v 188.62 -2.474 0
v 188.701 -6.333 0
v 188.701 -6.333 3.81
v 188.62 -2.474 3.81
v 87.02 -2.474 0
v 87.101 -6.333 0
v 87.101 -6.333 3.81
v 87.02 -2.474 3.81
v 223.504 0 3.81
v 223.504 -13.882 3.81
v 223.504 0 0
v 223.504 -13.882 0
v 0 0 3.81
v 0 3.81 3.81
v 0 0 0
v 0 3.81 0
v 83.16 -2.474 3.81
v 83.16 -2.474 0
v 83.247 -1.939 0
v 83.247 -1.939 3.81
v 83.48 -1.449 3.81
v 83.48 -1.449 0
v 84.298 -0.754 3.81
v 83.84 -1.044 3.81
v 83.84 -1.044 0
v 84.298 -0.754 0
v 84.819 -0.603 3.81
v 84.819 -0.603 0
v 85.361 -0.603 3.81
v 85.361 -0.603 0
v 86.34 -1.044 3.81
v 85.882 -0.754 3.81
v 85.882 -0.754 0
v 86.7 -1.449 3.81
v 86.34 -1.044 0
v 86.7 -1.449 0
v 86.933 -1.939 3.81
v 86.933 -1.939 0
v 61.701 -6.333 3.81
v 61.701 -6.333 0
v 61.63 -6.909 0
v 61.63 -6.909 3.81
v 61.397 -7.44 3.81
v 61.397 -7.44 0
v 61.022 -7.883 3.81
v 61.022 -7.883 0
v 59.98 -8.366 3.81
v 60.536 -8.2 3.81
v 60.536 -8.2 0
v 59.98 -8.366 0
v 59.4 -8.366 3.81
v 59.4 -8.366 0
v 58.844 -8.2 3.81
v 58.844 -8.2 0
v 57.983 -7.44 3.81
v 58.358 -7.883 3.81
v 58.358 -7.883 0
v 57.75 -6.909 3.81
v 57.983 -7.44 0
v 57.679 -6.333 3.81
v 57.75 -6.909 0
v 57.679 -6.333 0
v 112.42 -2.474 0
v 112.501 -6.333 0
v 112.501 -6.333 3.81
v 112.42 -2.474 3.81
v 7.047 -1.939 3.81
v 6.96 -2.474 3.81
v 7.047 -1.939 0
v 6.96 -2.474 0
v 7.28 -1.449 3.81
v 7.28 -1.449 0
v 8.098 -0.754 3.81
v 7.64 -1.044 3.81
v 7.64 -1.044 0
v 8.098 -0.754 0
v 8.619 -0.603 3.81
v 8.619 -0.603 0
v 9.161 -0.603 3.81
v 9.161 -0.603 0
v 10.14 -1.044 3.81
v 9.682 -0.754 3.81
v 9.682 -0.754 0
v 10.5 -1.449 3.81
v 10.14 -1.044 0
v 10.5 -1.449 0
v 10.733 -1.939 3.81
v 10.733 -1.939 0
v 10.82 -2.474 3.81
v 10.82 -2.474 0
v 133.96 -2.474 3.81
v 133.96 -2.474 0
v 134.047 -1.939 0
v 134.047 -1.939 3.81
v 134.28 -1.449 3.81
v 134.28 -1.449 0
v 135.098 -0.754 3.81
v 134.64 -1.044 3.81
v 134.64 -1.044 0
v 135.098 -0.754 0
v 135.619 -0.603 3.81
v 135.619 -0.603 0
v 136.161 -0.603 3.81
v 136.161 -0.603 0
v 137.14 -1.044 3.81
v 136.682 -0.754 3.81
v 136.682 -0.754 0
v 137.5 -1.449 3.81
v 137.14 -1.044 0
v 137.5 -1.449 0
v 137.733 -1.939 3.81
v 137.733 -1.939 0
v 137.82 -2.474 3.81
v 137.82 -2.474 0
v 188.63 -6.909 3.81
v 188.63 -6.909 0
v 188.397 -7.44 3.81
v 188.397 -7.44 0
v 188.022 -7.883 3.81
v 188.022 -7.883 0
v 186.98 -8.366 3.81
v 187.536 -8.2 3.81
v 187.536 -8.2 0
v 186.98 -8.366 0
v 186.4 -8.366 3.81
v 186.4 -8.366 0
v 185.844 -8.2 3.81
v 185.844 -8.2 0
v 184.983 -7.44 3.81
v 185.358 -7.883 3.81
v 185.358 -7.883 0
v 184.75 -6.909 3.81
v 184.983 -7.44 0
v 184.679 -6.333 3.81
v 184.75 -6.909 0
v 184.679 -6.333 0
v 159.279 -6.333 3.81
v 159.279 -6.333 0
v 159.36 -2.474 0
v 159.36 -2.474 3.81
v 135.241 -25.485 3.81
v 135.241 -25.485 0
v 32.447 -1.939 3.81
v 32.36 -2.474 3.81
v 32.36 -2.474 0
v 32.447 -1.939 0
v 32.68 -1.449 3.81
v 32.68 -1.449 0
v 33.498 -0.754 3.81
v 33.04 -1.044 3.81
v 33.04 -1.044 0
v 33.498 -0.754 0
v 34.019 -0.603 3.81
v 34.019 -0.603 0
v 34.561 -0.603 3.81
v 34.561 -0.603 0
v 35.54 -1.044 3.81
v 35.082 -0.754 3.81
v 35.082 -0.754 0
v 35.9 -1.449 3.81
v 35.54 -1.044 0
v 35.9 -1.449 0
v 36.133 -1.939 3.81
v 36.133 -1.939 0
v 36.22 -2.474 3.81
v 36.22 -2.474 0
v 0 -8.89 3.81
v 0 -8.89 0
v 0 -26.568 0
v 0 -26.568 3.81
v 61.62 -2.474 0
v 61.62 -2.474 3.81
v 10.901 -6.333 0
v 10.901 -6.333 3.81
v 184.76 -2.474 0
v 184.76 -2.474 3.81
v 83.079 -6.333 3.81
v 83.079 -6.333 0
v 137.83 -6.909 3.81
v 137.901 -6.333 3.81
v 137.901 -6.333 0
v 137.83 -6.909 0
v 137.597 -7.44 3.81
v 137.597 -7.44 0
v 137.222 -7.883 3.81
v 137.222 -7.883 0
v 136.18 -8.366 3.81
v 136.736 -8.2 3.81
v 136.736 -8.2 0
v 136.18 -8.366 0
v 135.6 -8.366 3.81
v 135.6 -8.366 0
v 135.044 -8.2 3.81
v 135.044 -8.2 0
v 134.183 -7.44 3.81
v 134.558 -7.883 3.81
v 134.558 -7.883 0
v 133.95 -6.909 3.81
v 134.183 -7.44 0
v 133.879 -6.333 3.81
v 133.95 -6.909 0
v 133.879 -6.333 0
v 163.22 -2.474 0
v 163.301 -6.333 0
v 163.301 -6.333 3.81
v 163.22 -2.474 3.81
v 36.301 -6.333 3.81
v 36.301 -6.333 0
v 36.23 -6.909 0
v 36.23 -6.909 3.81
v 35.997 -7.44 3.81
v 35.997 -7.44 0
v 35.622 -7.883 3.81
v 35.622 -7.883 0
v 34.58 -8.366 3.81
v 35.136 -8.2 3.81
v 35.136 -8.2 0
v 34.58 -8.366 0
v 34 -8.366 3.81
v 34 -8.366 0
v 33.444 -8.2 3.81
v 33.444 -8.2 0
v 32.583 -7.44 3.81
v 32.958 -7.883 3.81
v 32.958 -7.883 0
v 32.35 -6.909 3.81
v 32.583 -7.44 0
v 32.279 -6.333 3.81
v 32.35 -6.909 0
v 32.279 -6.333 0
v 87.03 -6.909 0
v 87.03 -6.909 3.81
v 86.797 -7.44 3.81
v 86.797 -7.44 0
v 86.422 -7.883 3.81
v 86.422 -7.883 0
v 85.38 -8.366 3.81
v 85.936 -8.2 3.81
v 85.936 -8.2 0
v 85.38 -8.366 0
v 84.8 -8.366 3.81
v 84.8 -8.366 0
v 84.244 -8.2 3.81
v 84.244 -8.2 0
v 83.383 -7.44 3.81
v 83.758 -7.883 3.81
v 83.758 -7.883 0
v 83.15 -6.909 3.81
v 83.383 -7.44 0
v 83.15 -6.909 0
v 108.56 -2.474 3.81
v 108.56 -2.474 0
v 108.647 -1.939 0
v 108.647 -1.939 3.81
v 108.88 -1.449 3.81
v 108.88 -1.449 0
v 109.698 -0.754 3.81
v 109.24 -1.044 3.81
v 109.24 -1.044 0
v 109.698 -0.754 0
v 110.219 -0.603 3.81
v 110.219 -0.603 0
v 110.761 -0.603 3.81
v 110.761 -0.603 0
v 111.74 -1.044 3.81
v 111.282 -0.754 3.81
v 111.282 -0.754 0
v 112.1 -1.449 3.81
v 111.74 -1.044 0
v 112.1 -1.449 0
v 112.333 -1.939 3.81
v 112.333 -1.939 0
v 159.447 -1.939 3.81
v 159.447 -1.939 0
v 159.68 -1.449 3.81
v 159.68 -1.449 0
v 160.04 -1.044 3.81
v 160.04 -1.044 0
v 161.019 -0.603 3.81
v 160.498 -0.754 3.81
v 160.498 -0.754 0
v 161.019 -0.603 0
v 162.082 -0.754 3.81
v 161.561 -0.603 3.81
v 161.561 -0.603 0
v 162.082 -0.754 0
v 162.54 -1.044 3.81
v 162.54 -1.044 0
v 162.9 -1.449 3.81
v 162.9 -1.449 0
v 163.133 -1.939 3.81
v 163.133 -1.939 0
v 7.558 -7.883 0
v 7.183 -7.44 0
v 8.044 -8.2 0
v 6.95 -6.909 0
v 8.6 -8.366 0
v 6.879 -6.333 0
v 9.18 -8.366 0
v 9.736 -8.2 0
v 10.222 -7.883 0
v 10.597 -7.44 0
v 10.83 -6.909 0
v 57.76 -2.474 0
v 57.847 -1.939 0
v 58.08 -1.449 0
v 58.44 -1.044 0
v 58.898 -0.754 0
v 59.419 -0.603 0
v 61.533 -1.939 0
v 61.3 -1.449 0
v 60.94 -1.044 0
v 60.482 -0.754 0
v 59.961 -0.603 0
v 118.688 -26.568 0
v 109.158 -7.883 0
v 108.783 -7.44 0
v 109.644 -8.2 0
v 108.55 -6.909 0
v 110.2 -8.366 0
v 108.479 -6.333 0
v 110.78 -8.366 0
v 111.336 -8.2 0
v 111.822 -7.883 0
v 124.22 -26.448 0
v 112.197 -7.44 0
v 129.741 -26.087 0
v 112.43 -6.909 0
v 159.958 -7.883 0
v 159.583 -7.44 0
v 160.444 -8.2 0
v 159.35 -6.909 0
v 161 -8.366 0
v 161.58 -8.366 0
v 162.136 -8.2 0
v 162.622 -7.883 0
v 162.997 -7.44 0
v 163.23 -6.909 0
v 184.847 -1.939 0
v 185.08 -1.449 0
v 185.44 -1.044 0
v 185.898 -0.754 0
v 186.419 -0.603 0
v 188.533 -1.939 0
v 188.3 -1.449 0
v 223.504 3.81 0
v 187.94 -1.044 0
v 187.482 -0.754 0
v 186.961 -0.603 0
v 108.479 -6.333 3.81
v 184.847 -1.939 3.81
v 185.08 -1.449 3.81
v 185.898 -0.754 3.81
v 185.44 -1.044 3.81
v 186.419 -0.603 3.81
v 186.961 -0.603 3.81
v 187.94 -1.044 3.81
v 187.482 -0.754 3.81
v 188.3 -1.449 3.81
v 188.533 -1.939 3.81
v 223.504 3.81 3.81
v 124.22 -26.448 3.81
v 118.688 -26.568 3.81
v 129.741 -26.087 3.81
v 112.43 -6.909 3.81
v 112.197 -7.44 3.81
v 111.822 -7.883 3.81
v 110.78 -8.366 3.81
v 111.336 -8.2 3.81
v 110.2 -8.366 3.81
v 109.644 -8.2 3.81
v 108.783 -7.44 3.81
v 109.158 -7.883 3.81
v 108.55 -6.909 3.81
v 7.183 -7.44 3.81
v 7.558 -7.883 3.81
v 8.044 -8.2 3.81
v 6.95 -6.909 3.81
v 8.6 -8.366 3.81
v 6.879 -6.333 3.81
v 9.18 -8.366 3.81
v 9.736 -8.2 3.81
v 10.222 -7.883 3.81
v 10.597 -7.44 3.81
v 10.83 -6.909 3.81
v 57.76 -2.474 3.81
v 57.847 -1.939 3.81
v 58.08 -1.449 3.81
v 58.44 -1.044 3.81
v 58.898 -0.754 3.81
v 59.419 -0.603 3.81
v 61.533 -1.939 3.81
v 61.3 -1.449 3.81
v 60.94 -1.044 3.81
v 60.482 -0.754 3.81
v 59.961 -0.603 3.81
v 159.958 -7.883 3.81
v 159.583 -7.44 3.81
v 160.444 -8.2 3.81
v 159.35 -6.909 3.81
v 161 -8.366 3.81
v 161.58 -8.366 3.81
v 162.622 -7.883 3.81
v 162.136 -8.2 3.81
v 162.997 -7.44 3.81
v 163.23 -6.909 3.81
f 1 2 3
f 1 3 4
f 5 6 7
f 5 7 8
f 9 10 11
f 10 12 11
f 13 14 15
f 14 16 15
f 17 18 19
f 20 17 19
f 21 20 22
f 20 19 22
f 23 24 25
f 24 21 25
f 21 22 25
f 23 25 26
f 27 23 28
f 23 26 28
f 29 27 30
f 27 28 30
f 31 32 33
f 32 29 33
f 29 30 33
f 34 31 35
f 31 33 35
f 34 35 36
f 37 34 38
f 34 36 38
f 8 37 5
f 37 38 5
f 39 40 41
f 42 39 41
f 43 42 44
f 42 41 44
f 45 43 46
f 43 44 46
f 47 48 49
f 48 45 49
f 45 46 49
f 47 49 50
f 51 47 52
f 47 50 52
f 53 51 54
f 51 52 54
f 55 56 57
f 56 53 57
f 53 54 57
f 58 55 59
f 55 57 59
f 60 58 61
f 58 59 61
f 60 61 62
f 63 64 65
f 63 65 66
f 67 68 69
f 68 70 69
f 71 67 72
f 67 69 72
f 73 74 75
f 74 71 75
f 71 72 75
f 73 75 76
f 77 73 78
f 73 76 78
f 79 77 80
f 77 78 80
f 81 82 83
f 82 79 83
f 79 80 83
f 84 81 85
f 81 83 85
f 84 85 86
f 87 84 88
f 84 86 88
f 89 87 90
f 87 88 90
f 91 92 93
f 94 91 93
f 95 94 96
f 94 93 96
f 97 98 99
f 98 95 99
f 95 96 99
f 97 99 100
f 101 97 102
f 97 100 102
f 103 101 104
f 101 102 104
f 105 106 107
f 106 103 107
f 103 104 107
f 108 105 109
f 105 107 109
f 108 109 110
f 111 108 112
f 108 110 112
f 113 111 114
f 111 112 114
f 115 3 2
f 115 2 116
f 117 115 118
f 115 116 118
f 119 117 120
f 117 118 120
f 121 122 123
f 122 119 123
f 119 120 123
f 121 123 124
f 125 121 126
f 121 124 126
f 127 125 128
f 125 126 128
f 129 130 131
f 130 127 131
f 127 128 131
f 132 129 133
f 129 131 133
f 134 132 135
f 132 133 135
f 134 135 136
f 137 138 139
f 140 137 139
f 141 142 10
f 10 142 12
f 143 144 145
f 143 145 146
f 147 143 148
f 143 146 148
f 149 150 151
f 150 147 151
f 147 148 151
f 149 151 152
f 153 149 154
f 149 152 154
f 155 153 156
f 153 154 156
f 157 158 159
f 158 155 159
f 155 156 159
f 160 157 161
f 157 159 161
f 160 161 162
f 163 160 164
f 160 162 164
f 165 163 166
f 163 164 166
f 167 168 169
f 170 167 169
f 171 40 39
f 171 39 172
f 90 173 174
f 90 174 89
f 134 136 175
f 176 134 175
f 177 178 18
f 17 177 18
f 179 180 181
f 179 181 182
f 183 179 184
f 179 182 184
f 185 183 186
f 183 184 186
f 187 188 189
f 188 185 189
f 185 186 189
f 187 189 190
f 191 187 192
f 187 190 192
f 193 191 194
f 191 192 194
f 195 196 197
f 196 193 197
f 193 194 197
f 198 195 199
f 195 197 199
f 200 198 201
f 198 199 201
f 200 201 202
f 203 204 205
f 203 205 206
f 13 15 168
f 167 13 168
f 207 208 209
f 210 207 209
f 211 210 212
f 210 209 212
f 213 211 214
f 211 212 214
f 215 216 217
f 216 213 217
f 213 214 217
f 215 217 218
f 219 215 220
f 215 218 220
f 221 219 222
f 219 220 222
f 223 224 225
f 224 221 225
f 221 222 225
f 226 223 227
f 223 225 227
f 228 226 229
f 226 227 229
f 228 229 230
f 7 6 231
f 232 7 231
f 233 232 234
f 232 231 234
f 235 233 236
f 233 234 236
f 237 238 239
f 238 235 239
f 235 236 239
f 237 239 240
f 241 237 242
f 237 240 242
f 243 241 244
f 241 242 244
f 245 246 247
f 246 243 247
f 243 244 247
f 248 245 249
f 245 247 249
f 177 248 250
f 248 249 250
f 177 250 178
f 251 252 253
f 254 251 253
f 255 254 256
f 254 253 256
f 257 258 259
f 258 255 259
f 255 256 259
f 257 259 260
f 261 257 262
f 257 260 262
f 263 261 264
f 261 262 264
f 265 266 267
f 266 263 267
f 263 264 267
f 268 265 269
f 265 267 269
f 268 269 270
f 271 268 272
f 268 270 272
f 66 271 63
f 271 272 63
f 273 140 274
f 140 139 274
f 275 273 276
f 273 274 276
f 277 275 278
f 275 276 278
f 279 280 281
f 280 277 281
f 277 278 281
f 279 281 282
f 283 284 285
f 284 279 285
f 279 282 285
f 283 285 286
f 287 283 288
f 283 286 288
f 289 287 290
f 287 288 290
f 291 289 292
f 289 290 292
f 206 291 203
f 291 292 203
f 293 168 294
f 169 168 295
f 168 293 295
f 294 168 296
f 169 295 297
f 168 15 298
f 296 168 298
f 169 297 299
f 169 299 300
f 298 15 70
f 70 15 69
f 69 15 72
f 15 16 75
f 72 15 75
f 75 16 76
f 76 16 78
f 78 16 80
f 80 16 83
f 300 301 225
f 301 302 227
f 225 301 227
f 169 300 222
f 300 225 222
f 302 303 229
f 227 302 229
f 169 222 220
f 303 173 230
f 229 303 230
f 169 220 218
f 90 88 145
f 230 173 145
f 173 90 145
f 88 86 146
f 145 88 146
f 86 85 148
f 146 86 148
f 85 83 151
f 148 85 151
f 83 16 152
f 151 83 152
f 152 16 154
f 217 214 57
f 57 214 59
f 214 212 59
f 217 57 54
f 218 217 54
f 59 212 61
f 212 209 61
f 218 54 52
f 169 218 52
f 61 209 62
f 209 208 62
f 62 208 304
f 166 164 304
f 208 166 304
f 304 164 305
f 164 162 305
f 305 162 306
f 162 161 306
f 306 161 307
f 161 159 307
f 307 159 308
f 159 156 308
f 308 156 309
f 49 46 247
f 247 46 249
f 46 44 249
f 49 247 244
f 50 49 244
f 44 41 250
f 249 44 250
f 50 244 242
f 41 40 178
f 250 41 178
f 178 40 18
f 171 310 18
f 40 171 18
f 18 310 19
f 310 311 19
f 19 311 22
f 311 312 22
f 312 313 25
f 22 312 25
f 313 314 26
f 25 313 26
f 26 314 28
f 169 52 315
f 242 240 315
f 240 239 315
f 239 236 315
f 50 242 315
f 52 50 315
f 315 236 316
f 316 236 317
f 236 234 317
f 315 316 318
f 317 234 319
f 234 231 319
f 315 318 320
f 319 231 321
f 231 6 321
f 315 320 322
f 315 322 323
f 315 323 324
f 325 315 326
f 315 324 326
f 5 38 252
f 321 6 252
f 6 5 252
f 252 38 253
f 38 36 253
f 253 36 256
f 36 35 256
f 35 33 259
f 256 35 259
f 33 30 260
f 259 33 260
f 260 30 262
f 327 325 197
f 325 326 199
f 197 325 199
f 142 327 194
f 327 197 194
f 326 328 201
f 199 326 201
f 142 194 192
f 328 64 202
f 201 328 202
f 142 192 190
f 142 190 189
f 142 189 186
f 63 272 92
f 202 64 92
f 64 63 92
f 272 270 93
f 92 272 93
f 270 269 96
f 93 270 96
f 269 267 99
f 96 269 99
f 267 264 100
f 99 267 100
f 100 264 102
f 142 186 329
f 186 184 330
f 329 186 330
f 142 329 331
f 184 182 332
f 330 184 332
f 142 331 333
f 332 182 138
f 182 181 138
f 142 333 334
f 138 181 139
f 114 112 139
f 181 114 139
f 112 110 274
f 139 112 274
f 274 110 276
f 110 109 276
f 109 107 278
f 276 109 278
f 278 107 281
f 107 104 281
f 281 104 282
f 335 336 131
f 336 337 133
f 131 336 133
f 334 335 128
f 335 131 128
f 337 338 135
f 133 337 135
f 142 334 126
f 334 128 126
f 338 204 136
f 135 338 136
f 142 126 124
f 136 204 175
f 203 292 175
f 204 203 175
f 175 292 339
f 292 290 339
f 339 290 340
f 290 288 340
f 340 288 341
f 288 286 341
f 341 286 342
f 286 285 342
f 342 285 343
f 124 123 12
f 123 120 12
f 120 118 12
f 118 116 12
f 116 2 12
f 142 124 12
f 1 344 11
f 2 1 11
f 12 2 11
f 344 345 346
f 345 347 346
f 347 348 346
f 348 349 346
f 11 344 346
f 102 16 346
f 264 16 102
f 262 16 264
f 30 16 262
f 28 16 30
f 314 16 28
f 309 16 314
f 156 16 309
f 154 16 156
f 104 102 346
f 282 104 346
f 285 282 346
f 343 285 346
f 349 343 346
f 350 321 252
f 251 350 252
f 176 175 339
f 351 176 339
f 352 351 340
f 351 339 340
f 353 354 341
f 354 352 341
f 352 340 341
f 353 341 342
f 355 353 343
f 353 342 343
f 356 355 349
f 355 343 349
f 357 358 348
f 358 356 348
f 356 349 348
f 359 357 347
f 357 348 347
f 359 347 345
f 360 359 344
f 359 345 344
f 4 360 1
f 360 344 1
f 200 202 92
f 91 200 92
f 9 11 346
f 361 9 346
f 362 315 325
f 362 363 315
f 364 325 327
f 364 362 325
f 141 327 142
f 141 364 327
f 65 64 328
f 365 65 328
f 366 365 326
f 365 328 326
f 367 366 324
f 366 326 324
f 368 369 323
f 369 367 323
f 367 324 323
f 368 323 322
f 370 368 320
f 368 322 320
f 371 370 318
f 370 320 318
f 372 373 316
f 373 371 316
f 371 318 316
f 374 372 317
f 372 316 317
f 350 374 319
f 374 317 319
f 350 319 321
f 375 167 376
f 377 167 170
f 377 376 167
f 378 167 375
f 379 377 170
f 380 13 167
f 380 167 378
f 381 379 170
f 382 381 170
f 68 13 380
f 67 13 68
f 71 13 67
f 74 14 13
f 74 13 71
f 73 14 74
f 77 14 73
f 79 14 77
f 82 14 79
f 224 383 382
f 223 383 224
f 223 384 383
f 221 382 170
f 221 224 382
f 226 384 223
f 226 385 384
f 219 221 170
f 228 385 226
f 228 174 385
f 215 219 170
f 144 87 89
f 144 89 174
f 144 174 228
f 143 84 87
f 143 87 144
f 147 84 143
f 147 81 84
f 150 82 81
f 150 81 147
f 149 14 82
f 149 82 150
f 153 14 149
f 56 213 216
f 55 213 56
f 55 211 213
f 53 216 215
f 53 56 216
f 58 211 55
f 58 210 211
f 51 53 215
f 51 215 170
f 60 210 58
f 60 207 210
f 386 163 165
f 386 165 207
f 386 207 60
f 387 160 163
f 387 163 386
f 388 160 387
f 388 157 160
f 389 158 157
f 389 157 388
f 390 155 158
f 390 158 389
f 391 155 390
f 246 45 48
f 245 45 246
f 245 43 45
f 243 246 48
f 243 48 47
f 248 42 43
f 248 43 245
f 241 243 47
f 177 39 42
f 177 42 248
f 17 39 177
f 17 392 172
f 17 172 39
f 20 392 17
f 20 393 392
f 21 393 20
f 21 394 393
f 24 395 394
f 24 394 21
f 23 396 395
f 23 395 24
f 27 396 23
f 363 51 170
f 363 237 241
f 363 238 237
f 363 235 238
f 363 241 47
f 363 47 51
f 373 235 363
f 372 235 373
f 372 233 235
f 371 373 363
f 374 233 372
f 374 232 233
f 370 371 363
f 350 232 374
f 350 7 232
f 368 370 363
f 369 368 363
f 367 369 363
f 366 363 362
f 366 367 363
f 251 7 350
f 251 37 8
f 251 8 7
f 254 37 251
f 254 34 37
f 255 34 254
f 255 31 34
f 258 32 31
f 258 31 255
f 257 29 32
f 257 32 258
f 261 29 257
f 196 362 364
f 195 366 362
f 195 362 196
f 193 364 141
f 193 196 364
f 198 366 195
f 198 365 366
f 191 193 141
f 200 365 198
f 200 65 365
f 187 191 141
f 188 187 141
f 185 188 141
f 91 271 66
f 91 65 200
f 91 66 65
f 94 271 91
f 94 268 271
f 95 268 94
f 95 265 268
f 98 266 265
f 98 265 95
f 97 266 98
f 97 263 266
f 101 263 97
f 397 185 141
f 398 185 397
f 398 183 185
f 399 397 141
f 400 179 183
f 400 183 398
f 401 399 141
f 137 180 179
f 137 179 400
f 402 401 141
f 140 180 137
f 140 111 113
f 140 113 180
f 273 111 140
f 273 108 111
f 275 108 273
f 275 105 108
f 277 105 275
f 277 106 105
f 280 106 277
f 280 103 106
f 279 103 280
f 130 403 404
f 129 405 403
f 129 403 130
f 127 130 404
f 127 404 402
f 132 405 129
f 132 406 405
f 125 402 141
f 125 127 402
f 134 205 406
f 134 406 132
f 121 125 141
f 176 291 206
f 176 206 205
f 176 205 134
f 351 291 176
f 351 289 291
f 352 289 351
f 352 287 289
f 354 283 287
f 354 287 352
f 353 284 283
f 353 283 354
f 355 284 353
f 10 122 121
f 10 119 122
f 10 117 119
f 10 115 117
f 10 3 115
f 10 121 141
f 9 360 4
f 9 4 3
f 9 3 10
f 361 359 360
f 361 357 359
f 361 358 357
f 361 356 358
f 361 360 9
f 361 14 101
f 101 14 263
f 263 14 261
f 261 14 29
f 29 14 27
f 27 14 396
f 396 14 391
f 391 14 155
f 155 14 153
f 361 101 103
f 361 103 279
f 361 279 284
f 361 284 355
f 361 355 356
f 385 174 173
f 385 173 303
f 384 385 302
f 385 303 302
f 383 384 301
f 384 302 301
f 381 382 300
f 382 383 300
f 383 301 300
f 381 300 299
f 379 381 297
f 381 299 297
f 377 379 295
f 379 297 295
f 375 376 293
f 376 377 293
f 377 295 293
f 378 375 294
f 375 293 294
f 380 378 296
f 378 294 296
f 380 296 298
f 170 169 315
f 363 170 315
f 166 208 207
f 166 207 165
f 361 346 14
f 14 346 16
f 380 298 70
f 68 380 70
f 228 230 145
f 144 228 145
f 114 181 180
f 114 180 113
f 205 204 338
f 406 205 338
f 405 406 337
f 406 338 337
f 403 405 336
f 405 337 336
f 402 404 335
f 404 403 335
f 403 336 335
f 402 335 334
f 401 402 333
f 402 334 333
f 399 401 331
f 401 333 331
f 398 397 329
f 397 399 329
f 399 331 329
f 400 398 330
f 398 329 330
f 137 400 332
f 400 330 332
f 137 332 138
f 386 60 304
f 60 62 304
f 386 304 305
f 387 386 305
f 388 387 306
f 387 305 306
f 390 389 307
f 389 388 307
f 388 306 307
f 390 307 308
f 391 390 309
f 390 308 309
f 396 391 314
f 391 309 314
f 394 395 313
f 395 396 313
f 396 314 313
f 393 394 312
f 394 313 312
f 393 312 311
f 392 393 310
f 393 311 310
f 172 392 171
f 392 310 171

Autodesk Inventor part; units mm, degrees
ref_plane "YZ Plane" through (0, 0, 0) normal (1, 0, 0) x (0, 1, 0)
ref_plane "XZ Plane" through (0, 0, 0) normal (0, 1, 0) x (-1, 0, 0)
ref_plane "XY Plane" through (0, 0, 0) normal (0, 0, 1) x (1, 0, 0)
ref_plane "Work Plane1" through (0, 0, 0) normal (0, 0, 1) x (1, 0, 0)
sketch "Sketch1" plane through (0, 0, 0) normal (0, 0, 1) x (1, 0, 0)
  circle A0 centre (59.69, -4.445) radius 1.9304 construction
  circle A1 centre (161.29, -4.445) radius 1.9304 construction
  circle A2 centre (135.89, -4.445) radius 1.9304 construction
  circle A3 centre (34.29, -4.445) radius 1.9304 construction
  circle A4 centre (85.09, -4.445) radius 1.9304 construction
  circle A5 centre (186.69, -4.445) radius 1.9304 construction
  circle A6 centre (110.49, -4.445) radius 1.9304 construction
  circle A7 centre (8.89, -4.445) radius 1.9304 construction
  line L0 (0, 0) -> (0, -8.89) construction
  line L1 (0, -8.89) -> (195.58, -8.89) construction
  line L2 (195.58, 0) -> (195.58, -8.89) construction
  line L3 (0, 0) -> (195.58, 0) construction
  circle A8 centre (254.7602, -6.1683) radius 25.137 construction
  line L4 (0, 0) -> (0, -8.89)
  line L5 (0, -8.89) -> (0, -26.5684)
  line L6 (0, -26.5684) -> (127, -26.5684)
  line L7 (127, -26.5684) -> (223.5038, -13.8825)
  line L8 (223.5038, -13.8825) -> (223.5038, 0)
  line L9 (223.5038, 0) -> (223.5038, 3.81)
  line L10 (223.5038, 3.81) -> (0, 3.81)
  line L11 (0, 3.81) -> (0, 0)
  line L12 (188.7012, -6.3331) -> (188.62, -2.474)
  line L13 (184.6788, -6.3331) -> (184.76, -2.474)
  arc A9 (163.22, -2.474) -> (159.36, -2.474) centre (161.29, -2.5146) ccw
  arc A10 (159.2788, -6.3331) -> (163.3012, -6.3331) centre (161.29, -6.3754) ccw
  line L14 (163.3012, -6.3331) -> (163.22, -2.474)
  line L15 (159.2788, -6.3331) -> (159.36, -2.474)
  arc A11 (137.82, -2.474) -> (133.96, -2.474) centre (135.89, -2.5146) ccw
  line L16 (137.9012, -6.3331) -> (137.82, -2.474)
  line L17 (133.8788, -6.3331) -> (133.96, -2.474)
  arc A12 (108.4788, -6.3331) -> (112.5012, -6.3331) centre (110.49, -6.3754) ccw
  line L18 (112.5012, -6.3331) -> (112.42, -2.474)
  line L19 (108.4788, -6.3331) -> (108.56, -2.474)
  arc A13 (87.02, -2.474) -> (83.16, -2.474) centre (85.09, -2.5146) ccw
  arc A14 (83.0788, -6.3331) -> (87.1012, -6.3331) centre (85.09, -6.3754) ccw
  line L20 (87.1012, -6.3331) -> (87.02, -2.474)
  line L21 (83.0788, -6.3331) -> (83.16, -2.474)
  arc A15 (61.62, -2.474) -> (57.76, -2.474) centre (59.69, -2.5146) ccw
  arc A16 (57.6788, -6.3331) -> (61.7012, -6.3331) centre (59.69, -6.3754) ccw
  line L22 (61.7012, -6.3331) -> (61.62, -2.474)
  line L23 (57.6788, -6.3331) -> (57.76, -2.474)
  arc A17 (36.22, -2.474) -> (32.36, -2.474) centre (34.29, -2.5146) ccw
  arc A18 (32.2788, -6.3331) -> (36.3012, -6.3331) centre (34.29, -6.3754) ccw
  line L24 (36.3012, -6.3331) -> (36.22, -2.474)
  line L25 (32.2788, -6.3331) -> (32.36, -2.474)
  arc A19 (10.82, -2.474) -> (6.96, -2.474) centre (8.89, -2.5146) ccw
  arc A20 (6.8788, -6.3331) -> (10.9012, -6.3331) centre (8.89, -6.3754) ccw
  line L26 (10.9012, -6.3331) -> (10.82, -2.474)
  line L27 (6.8788, -6.3331) -> (6.96, -2.474)
  arc A21 (184.6788, -6.3331) -> (188.7012, -6.3331) centre (186.69, -6.3754) ccw
  arc A22 (188.62, -2.474) -> (184.76, -2.474) centre (186.69, -2.5146) ccw
  arc A23 (133.8788, -6.3331) -> (137.9012, -6.3331) centre (135.89, -6.3754) ccw
  arc A24 (112.42, -2.474) -> (108.56, -2.474) centre (110.49, -2.5146) ccw
  dimension "d0" = 17.6784
  dimension "d1" = 127
  dimension "d2" = 3.81
extrude "Extrusion1" add sketch "Sketch1" along normal blind 3.81
fillet "Fillet1" radius 127 1 edges at (127, -26.5684, 1.905)
properties part number "guide rails"
